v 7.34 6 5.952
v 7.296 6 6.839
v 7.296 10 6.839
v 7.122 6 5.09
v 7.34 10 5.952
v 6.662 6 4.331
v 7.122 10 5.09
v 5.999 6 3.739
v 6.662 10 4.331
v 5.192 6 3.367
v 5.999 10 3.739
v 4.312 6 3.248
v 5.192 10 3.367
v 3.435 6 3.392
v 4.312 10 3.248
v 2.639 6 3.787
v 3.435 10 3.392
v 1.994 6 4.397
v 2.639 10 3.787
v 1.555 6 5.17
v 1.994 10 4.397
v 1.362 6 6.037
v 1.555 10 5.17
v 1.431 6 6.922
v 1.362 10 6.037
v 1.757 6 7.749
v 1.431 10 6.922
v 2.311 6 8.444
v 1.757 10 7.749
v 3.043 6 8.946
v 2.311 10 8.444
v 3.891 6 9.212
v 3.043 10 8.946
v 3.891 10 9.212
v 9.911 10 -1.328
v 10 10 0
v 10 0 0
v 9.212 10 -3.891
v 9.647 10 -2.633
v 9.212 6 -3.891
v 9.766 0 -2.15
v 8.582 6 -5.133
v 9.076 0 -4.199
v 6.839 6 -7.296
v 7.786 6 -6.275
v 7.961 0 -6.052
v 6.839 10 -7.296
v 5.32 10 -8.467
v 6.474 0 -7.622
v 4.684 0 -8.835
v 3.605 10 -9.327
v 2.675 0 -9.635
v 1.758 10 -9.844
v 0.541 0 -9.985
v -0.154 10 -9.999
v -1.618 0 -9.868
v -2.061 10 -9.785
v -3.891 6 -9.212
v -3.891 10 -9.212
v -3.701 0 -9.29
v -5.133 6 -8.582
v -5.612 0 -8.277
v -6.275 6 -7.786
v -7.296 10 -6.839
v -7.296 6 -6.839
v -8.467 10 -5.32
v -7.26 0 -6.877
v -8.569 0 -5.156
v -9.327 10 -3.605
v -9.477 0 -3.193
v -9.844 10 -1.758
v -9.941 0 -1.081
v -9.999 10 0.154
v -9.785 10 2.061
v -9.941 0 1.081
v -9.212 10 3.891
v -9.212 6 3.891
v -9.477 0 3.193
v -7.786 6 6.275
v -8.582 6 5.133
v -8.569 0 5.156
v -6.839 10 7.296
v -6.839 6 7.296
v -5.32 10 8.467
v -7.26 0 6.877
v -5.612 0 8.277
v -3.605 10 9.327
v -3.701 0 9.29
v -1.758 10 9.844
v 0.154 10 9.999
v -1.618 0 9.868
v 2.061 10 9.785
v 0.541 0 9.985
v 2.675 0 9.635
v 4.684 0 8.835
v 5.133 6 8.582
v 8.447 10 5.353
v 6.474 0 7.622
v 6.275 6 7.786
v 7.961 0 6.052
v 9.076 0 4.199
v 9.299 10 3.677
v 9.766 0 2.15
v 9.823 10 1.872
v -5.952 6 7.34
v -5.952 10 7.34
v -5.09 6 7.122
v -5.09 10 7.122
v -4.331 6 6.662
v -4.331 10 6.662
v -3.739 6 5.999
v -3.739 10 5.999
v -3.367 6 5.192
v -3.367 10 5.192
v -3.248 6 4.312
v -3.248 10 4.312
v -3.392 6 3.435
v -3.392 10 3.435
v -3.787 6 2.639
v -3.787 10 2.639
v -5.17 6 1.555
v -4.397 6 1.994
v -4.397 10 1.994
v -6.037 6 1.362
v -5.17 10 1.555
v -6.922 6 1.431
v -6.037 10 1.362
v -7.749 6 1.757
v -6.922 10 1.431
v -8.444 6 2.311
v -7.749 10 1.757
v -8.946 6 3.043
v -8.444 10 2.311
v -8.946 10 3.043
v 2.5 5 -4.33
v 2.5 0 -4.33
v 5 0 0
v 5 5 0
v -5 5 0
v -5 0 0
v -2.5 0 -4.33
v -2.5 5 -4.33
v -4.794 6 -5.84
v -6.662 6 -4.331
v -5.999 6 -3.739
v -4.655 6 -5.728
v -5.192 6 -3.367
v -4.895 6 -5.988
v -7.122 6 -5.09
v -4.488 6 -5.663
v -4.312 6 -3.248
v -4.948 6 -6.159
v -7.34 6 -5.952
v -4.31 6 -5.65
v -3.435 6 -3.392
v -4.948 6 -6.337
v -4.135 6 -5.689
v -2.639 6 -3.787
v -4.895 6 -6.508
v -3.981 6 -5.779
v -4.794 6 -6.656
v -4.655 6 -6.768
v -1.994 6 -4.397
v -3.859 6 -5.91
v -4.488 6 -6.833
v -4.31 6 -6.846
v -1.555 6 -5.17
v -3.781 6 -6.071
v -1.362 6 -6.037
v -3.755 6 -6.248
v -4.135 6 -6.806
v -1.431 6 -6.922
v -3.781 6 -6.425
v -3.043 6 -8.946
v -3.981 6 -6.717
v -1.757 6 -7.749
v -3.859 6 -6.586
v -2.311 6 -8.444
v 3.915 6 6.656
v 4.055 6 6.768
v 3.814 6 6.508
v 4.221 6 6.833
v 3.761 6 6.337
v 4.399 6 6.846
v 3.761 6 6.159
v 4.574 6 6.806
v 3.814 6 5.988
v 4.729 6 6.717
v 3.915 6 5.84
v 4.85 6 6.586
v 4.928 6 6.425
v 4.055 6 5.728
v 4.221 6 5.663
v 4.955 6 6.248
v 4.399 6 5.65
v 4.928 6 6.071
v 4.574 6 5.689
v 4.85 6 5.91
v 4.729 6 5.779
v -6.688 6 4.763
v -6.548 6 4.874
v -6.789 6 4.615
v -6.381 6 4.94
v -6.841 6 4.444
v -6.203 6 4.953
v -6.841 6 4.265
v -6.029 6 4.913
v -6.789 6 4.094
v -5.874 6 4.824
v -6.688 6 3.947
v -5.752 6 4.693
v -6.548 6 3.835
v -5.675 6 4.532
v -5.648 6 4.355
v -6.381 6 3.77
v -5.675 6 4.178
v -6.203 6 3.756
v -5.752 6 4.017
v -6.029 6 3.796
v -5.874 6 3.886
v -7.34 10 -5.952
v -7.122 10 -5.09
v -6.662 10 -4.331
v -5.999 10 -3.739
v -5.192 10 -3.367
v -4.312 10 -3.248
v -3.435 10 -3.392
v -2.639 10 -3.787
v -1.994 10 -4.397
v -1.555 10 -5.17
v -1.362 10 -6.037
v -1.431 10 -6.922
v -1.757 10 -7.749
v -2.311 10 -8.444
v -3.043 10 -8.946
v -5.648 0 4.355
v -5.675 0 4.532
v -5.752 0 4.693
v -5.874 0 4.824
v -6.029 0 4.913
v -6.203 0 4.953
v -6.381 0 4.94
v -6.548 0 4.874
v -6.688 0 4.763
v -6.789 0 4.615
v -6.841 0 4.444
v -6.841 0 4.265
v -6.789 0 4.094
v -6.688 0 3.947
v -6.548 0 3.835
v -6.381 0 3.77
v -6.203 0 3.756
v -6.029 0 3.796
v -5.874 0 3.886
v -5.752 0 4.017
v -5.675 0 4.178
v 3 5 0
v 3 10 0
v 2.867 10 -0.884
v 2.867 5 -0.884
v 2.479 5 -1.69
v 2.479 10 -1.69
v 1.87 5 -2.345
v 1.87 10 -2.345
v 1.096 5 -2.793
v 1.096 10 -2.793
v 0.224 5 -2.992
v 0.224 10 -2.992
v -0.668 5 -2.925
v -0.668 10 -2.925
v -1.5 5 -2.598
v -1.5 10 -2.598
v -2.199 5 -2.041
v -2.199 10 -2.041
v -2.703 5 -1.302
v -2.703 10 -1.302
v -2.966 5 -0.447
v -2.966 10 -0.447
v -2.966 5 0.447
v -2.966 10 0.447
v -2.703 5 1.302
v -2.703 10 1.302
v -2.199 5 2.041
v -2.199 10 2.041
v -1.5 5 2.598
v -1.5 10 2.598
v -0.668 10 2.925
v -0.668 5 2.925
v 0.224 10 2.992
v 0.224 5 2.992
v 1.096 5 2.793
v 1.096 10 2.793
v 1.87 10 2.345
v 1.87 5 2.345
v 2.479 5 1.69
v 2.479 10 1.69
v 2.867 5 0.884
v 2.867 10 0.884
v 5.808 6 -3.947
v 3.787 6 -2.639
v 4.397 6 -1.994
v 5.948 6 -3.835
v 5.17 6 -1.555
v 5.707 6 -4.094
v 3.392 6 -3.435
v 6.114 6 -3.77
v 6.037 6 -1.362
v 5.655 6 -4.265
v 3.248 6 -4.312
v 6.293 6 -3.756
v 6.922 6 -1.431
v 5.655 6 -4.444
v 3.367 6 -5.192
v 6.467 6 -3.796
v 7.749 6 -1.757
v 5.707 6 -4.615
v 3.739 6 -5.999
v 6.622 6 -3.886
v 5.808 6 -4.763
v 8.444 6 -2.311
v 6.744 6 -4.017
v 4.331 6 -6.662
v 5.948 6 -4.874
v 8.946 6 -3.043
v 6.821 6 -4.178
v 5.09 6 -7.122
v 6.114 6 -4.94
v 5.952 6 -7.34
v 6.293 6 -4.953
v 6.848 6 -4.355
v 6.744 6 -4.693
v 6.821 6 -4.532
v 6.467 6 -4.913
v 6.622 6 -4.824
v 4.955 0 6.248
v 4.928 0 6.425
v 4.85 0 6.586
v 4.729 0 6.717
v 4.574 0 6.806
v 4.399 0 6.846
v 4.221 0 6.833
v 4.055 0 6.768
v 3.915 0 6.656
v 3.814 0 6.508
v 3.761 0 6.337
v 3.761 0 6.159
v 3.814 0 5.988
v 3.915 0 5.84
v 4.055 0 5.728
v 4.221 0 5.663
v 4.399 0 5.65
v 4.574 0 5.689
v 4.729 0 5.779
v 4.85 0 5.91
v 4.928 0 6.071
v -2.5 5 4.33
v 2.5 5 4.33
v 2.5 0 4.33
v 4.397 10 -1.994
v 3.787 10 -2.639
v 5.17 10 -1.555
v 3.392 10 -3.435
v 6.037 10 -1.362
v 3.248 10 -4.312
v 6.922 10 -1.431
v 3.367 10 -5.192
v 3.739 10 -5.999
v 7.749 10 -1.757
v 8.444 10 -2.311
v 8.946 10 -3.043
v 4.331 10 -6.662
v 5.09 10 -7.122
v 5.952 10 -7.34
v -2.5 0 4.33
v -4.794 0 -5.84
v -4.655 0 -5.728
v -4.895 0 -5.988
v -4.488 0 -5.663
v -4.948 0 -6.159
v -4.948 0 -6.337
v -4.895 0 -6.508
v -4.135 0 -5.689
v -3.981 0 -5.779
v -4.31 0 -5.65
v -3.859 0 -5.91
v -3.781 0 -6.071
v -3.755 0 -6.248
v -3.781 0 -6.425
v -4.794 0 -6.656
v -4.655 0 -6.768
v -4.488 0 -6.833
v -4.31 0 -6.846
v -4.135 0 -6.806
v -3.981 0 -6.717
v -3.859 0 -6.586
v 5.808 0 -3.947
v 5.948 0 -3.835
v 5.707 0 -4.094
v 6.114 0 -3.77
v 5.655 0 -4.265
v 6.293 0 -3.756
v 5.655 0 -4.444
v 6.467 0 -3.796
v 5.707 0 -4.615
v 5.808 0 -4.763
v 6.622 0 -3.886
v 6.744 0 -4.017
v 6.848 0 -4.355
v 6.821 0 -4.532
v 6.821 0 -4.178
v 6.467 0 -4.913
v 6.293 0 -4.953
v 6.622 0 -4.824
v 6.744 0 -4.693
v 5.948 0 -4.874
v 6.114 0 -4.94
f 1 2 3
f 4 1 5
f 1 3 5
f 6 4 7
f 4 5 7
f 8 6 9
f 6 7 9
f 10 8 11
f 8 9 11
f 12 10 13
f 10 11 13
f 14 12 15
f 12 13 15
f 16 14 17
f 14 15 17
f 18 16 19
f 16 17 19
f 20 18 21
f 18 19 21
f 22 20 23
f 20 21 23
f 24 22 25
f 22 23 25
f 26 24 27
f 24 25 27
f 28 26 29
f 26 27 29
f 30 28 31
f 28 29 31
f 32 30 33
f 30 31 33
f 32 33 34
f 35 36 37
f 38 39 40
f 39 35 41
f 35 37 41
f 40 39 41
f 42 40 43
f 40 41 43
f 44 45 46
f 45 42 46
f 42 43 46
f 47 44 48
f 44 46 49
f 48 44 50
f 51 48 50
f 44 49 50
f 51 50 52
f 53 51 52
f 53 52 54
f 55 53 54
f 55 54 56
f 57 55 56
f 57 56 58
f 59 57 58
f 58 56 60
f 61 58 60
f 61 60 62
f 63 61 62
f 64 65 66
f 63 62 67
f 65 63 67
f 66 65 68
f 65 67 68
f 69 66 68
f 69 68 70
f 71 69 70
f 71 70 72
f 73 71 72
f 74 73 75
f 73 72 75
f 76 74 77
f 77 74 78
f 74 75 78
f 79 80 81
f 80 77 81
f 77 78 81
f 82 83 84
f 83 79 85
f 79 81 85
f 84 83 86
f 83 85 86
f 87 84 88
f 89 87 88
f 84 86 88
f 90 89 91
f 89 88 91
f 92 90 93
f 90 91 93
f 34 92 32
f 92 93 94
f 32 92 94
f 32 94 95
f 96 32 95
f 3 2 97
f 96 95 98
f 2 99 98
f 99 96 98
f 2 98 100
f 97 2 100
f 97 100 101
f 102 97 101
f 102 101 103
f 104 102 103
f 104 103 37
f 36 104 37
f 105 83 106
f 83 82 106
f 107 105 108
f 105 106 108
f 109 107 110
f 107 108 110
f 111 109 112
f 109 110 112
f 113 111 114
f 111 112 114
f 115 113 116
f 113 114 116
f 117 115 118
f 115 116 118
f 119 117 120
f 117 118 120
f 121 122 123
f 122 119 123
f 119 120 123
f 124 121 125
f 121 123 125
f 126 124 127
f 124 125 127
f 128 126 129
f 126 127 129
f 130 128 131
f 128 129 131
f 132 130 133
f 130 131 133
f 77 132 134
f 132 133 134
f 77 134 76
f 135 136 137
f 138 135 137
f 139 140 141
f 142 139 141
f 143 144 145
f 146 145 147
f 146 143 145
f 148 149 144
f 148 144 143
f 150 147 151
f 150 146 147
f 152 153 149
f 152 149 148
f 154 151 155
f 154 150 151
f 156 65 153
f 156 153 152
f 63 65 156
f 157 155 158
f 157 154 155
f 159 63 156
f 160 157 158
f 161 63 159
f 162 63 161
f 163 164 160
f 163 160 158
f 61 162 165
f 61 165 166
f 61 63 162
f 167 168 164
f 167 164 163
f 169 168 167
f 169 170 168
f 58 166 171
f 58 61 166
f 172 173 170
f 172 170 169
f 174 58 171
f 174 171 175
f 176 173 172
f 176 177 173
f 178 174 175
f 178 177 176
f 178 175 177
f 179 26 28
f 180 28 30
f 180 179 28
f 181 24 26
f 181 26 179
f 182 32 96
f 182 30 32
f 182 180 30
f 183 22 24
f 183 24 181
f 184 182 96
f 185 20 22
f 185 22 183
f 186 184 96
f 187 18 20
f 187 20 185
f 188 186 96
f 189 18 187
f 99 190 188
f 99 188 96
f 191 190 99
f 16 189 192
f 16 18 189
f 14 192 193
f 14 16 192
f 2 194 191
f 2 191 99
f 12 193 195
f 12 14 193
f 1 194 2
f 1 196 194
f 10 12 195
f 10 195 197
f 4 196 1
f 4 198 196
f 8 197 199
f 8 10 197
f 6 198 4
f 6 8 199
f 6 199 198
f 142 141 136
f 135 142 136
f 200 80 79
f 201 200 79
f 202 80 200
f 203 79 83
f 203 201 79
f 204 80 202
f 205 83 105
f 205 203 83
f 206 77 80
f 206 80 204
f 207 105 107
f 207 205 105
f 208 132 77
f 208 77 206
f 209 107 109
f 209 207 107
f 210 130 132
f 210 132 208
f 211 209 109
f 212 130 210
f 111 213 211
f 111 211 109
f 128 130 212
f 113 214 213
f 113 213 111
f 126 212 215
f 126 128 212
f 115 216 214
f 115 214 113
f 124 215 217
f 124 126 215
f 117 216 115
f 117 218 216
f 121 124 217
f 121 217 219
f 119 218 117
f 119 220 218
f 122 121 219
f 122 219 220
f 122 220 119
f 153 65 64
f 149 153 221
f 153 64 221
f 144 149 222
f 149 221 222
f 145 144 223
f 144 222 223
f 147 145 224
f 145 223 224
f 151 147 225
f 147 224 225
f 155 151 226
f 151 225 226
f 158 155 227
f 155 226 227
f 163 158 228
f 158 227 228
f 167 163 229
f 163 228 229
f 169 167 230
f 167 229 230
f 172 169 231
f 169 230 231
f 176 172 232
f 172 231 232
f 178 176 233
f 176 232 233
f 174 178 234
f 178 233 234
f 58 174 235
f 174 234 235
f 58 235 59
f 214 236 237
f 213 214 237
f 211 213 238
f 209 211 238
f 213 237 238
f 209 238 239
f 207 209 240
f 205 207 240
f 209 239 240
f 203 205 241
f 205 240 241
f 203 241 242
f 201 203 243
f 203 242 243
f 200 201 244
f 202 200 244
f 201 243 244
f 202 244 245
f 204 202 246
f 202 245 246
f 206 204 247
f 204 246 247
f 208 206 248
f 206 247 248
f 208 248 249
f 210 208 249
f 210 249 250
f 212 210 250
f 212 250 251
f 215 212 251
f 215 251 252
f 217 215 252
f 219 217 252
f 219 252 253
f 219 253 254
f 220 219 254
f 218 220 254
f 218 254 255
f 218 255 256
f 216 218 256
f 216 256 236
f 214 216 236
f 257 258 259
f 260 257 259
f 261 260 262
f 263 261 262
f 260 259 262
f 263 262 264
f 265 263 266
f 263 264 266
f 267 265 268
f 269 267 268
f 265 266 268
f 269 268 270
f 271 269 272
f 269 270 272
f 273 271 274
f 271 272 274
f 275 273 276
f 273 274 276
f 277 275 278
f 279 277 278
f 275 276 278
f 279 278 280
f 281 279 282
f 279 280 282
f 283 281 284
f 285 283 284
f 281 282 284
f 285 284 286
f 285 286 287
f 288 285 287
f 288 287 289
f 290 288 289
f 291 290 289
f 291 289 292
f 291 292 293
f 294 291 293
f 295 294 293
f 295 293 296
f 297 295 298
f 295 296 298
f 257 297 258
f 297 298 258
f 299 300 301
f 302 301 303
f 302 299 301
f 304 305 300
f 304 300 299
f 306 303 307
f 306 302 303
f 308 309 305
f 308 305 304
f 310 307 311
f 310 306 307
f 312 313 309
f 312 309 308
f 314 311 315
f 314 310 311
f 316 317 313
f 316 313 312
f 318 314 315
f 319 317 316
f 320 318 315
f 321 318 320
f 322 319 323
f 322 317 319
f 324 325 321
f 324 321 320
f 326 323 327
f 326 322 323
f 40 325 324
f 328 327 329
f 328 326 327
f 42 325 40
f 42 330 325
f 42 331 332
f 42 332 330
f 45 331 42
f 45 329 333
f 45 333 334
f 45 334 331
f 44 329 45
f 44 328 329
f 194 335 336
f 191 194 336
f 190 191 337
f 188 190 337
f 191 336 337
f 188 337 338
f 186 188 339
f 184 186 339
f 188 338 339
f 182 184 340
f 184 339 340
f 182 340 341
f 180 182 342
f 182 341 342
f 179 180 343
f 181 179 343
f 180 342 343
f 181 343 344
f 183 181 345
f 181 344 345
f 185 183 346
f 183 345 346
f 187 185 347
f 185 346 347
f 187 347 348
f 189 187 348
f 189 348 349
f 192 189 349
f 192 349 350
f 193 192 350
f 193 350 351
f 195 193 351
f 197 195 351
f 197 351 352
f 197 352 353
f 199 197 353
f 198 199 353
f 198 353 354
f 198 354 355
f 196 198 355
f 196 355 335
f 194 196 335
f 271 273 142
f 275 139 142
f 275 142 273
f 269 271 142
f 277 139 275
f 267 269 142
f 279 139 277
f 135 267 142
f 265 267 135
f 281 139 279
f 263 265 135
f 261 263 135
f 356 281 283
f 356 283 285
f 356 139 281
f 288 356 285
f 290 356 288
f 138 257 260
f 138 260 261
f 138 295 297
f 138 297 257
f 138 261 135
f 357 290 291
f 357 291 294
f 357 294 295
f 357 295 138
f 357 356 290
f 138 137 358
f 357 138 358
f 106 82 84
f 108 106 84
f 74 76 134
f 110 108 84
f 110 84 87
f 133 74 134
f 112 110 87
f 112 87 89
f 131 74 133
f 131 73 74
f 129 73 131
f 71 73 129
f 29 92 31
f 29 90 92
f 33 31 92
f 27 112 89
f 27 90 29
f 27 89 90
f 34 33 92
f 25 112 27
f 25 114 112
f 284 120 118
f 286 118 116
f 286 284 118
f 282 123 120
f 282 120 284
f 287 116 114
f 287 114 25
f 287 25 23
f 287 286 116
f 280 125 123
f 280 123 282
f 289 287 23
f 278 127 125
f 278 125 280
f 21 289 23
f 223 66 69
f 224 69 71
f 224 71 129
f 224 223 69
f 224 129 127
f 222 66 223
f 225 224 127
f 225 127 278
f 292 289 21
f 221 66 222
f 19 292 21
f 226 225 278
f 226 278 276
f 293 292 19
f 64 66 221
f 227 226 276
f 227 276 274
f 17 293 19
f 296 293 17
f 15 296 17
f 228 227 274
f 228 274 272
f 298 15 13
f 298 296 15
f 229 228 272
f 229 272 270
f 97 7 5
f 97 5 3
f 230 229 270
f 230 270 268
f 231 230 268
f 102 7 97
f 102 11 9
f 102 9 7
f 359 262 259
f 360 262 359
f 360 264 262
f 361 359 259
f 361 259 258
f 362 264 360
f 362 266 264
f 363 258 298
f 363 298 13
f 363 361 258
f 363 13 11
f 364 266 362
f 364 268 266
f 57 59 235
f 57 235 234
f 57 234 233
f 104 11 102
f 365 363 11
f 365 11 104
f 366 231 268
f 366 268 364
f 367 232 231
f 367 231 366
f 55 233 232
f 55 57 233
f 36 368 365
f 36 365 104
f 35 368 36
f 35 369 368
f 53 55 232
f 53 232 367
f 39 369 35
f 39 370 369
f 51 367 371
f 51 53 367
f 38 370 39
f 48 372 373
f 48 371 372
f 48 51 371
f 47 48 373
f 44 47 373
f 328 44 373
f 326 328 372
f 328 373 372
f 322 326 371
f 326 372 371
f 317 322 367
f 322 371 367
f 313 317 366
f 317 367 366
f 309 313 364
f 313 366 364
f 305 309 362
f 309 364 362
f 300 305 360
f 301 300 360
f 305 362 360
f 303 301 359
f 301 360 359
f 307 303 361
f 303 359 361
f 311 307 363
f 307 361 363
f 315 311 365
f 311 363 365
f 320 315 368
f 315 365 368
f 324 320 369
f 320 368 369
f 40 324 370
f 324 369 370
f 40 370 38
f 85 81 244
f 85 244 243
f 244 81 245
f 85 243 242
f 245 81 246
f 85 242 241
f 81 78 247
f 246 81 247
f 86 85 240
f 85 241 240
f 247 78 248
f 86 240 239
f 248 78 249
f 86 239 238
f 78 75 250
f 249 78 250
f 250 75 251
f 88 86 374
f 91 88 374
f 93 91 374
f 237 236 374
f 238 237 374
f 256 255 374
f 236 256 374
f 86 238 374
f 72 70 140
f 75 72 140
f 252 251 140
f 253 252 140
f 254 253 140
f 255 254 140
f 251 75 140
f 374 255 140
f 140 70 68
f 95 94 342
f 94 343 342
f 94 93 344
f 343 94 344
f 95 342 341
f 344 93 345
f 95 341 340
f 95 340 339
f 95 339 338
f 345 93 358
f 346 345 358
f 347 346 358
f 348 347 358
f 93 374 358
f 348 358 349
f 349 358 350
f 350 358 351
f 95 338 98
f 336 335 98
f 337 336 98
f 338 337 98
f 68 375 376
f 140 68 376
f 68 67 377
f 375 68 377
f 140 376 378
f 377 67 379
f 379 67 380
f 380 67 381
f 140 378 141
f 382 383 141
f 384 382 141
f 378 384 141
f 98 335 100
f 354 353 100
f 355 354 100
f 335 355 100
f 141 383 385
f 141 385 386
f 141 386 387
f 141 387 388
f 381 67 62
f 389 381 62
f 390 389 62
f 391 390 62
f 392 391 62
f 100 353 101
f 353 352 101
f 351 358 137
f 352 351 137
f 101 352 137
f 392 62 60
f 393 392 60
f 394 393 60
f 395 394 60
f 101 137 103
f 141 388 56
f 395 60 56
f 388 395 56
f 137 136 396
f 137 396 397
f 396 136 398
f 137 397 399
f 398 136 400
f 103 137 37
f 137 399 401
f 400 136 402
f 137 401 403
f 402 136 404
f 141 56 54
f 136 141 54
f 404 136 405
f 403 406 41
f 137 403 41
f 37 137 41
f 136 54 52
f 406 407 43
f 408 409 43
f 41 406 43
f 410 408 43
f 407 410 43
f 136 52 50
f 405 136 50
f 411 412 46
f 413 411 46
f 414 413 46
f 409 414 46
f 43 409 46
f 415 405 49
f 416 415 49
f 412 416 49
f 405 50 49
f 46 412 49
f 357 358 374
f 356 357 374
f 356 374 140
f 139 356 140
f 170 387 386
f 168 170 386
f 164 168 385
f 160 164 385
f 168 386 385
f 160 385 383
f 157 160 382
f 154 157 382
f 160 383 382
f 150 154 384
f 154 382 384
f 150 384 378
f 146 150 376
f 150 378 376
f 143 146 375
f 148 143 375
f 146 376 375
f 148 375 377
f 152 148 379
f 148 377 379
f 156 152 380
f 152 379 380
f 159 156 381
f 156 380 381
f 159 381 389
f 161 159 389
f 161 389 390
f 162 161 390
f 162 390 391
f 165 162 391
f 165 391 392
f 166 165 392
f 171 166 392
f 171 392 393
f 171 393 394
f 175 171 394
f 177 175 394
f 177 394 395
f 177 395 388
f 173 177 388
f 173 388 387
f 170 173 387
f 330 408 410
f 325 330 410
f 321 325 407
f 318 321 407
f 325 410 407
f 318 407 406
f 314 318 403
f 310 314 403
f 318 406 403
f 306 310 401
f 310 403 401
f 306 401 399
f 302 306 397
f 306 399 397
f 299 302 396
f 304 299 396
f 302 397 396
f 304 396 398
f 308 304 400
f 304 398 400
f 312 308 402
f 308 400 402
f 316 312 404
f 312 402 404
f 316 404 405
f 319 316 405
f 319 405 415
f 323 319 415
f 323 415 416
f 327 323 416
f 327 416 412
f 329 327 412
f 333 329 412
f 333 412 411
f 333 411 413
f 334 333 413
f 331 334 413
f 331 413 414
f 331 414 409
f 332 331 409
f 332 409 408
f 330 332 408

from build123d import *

# Parameters (mm, degrees)
CROQUIS1_R              = 10
SALIENTE_EXTRUIR1_DEPTH = 10
CORTAR_EXTRUIR1_DEPTH   = 5
CROQUIS3_R              = 0.6
CORTAR_EXTRUIR2_DEPTH   = 10
CROQUIS4_R              = 3
CORTAR_EXTRUIR3_DEPTH   = 5
CROQUIS5_R              = 3
CORTAR_EXTRUIR4_DEPTH   = 4


with BuildPart() as part:
    # Croquis1 → Saliente-Extruir1 (new body)
    with BuildSketch(Plane(origin=(0, 0, 0), x_dir=(1, 0, 0), z_dir=(0, 1, 0))):
        Circle(CROQUIS1_R)
    extrude(amount=SALIENTE_EXTRUIR1_DEPTH)

    # Croquis2 → Cortar-Extruir1 (cut)
    with BuildSketch(Plane.XZ):
        Polygon((5, 0), (2.5, 4.330127019), (-2.5, 4.330127019), (-5, 0), (-2.5, -4.330127019), (2.5, -4.330127019), align=None)
    extrude(amount=-CORTAR_EXTRUIR1_DEPTH, mode=Mode.SUBTRACT)

    # Croquis3 → Cortar-Extruir2 (cut)
    with BuildSketch(Plane.XZ):
        with Locations((-6.247955751, 4.354658302)):
            Circle(CROQUIS3_R)
        with Locations((6.247955751, -4.354658302)):
            Circle(CROQUIS3_R)
        with Locations((4.354658302, 6.247955751)):
            Circle(CROQUIS3_R)
        with Locations((-4.354658302, -6.247955751)):
            Circle(CROQUIS3_R)
    extrude(amount=-CORTAR_EXTRUIR2_DEPTH, mode=Mode.SUBTRACT)

    # Croquis4 → Cortar-Extruir3 (cut)
    with BuildSketch(Plane(origin=(0, 10, 0), x_dir=(1, 0, 0), z_dir=(0, 1, 0))):
        Circle(CROQUIS4_R)
    extrude(amount=-CORTAR_EXTRUIR3_DEPTH, mode=Mode.SUBTRACT)

    # Croquis5 → Cortar-Extruir4 (cut)
    with BuildSketch(Plane(origin=(0, 10, 0), x_dir=(1, 0, 0), z_dir=(0, 1, 0))):
        with Locations((6.247955751, 4.354658302)):
            Circle(CROQUIS5_R)
        with Locations((-4.354658302, 6.247955751)):
            Circle(CROQUIS5_R)
        with Locations((-6.247955751, -4.354658302)):
            Circle(CROQUIS5_R)
        with Locations((4.354658302, -6.247955751)):
            Circle(CROQUIS5_R)
    extrude(amount=-CORTAR_EXTRUIR4_DEPTH, mode=Mode.SUBTRACT)


solid = part.part
